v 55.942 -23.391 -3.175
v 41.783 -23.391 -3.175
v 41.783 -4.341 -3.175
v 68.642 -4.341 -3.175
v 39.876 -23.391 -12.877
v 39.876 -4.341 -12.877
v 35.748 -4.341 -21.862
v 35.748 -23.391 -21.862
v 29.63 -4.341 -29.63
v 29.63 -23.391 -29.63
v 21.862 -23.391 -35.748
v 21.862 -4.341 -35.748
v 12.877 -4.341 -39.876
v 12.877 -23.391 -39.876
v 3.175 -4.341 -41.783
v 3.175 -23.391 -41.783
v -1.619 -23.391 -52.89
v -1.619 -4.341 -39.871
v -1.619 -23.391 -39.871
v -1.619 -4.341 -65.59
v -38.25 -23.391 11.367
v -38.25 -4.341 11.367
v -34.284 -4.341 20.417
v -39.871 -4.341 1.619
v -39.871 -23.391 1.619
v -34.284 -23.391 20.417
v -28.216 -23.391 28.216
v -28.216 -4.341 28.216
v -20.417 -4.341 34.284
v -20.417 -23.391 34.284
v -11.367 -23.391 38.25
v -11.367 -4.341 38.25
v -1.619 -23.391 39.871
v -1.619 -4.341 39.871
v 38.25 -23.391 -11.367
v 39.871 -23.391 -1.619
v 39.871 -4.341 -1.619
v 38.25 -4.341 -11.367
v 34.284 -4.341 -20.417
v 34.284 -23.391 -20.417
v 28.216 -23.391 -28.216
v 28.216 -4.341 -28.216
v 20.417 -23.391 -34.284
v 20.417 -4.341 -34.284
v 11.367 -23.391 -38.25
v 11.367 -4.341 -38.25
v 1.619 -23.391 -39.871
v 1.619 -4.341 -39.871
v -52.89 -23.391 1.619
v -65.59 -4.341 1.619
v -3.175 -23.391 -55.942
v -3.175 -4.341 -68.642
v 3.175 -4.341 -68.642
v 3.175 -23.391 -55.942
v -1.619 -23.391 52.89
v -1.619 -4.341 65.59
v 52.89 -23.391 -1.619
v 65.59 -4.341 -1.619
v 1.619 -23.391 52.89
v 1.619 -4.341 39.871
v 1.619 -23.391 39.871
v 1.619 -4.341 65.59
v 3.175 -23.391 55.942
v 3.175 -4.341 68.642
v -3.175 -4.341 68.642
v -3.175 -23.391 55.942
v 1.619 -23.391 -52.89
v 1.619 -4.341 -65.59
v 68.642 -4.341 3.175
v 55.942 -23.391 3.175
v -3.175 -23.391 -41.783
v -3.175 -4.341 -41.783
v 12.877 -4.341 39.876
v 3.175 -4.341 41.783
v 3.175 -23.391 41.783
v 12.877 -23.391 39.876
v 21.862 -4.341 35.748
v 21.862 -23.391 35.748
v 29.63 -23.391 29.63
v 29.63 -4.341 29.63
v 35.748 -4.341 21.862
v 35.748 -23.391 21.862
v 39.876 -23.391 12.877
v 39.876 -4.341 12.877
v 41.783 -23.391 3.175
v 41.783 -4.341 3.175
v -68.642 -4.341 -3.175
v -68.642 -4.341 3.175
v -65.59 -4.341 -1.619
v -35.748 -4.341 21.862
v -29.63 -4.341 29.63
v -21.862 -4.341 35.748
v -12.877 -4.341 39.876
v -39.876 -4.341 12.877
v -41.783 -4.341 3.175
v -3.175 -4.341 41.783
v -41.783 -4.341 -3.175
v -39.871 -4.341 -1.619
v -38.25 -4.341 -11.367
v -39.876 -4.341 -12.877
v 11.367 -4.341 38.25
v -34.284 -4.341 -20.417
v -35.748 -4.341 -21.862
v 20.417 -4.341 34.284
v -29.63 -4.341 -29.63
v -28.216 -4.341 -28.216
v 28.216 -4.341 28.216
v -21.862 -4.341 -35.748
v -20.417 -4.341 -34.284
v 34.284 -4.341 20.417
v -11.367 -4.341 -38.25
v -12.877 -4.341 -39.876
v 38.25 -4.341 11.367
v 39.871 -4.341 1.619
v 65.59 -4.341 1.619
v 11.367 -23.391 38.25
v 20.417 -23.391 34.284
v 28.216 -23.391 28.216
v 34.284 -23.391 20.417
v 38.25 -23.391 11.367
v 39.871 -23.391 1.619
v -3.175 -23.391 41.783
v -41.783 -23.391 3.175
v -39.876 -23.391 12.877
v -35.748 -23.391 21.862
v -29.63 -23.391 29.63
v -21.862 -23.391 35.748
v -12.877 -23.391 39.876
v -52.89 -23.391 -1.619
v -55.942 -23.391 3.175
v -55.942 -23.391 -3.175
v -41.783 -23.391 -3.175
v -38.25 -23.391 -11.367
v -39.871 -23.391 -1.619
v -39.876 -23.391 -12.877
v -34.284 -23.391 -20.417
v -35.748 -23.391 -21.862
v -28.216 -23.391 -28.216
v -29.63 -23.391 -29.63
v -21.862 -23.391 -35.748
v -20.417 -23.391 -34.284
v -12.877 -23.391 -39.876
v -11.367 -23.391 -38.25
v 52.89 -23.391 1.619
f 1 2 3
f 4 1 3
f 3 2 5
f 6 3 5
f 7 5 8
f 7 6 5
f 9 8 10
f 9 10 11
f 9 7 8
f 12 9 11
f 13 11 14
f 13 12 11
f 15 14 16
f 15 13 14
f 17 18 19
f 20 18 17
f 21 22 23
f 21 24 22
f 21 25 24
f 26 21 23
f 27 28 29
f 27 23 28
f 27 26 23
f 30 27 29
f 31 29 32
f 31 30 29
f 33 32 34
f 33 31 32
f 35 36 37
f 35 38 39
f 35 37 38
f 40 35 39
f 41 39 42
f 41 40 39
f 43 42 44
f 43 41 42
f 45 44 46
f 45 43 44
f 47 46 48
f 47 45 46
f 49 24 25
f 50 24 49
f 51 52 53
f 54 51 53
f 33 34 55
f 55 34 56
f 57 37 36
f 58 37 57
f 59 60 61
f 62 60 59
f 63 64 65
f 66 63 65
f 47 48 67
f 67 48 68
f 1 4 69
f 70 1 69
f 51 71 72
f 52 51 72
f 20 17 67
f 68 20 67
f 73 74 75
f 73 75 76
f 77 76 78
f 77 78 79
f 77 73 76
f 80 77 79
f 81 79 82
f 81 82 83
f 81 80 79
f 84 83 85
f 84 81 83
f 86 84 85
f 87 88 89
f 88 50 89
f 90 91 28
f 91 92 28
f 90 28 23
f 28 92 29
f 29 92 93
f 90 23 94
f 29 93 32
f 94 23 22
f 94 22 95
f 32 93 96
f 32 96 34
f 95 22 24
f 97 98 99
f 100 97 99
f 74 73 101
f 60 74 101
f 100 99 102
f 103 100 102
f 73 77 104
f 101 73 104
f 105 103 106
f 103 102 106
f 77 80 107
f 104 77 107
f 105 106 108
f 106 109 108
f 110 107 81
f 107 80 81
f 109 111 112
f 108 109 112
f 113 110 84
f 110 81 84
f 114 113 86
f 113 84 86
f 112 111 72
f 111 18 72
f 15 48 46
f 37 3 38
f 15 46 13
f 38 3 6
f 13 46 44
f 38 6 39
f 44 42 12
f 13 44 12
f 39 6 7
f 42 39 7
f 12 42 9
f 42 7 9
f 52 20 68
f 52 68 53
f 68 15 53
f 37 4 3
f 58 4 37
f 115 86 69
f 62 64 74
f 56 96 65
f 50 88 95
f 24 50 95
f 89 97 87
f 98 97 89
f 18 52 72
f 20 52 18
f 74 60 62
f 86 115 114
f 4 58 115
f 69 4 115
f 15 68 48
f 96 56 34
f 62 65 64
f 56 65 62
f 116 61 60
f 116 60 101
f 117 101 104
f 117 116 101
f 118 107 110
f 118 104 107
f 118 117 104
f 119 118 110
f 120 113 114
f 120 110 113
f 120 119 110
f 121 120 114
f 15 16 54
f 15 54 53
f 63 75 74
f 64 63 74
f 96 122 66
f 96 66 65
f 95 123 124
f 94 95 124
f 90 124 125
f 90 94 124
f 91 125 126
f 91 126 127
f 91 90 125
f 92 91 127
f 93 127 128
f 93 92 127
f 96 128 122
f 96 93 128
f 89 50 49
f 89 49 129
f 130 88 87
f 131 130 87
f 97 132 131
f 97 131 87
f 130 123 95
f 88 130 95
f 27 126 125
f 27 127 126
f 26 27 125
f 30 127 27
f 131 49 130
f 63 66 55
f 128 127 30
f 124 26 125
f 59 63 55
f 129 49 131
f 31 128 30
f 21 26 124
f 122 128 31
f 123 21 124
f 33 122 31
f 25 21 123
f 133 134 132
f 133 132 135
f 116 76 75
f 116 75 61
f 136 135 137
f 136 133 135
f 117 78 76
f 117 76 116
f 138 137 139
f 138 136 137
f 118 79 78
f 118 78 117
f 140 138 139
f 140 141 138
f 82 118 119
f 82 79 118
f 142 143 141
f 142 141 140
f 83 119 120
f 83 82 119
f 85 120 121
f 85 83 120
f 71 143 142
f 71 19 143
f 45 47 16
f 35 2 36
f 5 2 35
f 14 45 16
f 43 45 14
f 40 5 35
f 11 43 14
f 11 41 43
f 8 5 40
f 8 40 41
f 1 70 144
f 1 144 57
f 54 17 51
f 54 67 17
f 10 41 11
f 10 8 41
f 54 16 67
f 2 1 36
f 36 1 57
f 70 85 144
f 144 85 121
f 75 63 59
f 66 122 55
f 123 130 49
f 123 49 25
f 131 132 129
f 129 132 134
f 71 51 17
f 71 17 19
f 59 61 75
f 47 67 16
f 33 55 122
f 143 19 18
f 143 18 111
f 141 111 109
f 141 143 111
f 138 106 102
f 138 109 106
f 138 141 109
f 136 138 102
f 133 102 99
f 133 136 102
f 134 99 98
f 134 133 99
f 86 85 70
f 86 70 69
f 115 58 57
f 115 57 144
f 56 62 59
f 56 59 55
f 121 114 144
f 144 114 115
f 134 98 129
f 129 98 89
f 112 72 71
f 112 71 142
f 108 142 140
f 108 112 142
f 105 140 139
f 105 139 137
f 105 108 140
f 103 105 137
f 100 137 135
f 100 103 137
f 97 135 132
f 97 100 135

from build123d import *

# Parameters (mm, degrees)
SKETCH1_R                = 41.9034
SKETCH1_R_2              = 39.9034
BOSS_EXTRUDE1_DEPTH      = 57.15
BOSS_EXTRUDE2_REACH      = 137.075
BOSS_EXTRUDE2_END_RADIUS = 41.9034
SKETCH4_W                = 6.35
SKETCH4_H                = 96.707907256
CUT_EXTRUDE1_REACH       = 161.401
CUT_EXTRUDE1_END_RADIUS  = 39.9034
SKETCH5_W                = 3.2385
SKETCH5_H                = 67.115737741
CIRPATTERN1_COUNT        = 4
SKETCH6_W                = 191.094400596
SKETCH6_H                = 76.2
SKETCH6_H_2              = 57.15
CUT_EXTRUDE2_DEPTH       = 154.043134259
CUT_EXTRUDE2_DEPTH_BACK  = 154.043134259


with BuildPart() as part:
    # Sketch1 → Boss-Extrude1 (new, symmetric)
    with BuildSketch(Plane(origin=(0, 0, 0), x_dir=(1, 0, 0), z_dir=(0, 1, 0))):
        with Locations(Location((0, 0, 0), (0, 0, 270))):
            Circle(SKETCH1_R)
        with Locations(Location((0, 0, 0), (0, 0, 270))):
            Circle(SKETCH1_R_2, mode=Mode.SUBTRACT)
    extrude(amount=BOSS_EXTRUDE1_DEPTH, both=True)

    # Boss-Extrude2: up to this cylinder (the profile starts outside it)
    boss_extrude2_end = Plane(origin=(0, -4.217047, 0), z_dir=(0, -1, 0)) * Cylinder(BOSS_EXTRUDE2_END_RADIUS, 358.9568, mode=Mode.PRIVATE)
    # Sketch4 → Boss-Extrude2 (add, up to the surface)
    with BuildSketch(Plane(origin=(0, -33.016886495, -49.525456207), x_dir=(1, 0, 0), z_dir=(0, 0.5546992156114063, 0.8320509480795575)), mode=Mode.PRIVATE) as boss_extrude2_sk1:
        with Locations((0, 34.613072097)):
            Rectangle(SKETCH4_W, SKETCH4_H)
    boss_extrude2_tool1 = extrude(boss_extrude2_sk1.sketch, amount=BOSS_EXTRUDE2_REACH, mode=Mode.PRIVATE) - boss_extrude2_end
    boss_extrude2 = boss_extrude2_tool1.solids().sort_by_distance((0, -4.217047, -68.7253))[0]
    add(boss_extrude2)

    # Cut-Extrude1: up to this cylinder (the profile starts outside it)
    cut_extrude1_end = Plane(origin=(0, 56.039365, 0), z_dir=(0, -1, 0)) * Cylinder(CUT_EXTRUDE1_END_RADIUS, 403.6088, mode=Mode.PRIVATE)
    # Sketch5 → Cut-Extrude1 (cut, up to the surface)
    with BuildSketch(Plane(origin=(0, 69.032792414, -46.021744091), x_dir=(1, 0, 0), z_dir=(0, 0.8320509480795577, -0.5546992156114063)), mode=Mode.PRIVATE) as cut_extrude1_sk1:
        with Locations((0, 23.424274962)):
            Rectangle(SKETCH5_W, SKETCH5_H)
    cut_extrude1_tool1 = extrude(cut_extrude1_sk1.sketch, amount=-CUT_EXTRUDE1_REACH, mode=Mode.PRIVATE) - cut_extrude1_end
    cut_extrude1 = cut_extrude1_tool1.solids().sort_by_distance((0, 56.039365, -65.511934))[0]
    add(cut_extrude1, mode=Mode.SUBTRACT)

    # CirPattern1: Boss-Extrude2, Cut-Extrude1 ×4 about axis
    cirpattern1_axis = Axis((0, 0, 0), (0, 1, 0))
    add([boss_extrude2.rotate(cirpattern1_axis, i * 360 / CIRPATTERN1_COUNT) for i in range(1, CIRPATTERN1_COUNT)])
    add([cut_extrude1.rotate(cirpattern1_axis, i * 360 / CIRPATTERN1_COUNT) for i in range(1, CIRPATTERN1_COUNT)], mode=Mode.SUBTRACT)

    # Sketch6 → Cut-Extrude2 (cut, two sides)
    with BuildSketch(Plane(origin=(0, 0, 0), x_dir=(0, 0, -1), z_dir=(1, 0, 0))) as cut_extrude2_sk:
        with Locations((0, 33.758652745)):
            Rectangle(SKETCH6_W, SKETCH6_H)
        with Locations((0, -51.966347255)):
            Rectangle(SKETCH6_W, SKETCH6_H_2)
    extrude(amount=CUT_EXTRUDE2_DEPTH, mode=Mode.SUBTRACT)
    extrude(cut_extrude2_sk.sketch, amount=-CUT_EXTRUDE2_DEPTH_BACK, mode=Mode.SUBTRACT)


solid = part.part
